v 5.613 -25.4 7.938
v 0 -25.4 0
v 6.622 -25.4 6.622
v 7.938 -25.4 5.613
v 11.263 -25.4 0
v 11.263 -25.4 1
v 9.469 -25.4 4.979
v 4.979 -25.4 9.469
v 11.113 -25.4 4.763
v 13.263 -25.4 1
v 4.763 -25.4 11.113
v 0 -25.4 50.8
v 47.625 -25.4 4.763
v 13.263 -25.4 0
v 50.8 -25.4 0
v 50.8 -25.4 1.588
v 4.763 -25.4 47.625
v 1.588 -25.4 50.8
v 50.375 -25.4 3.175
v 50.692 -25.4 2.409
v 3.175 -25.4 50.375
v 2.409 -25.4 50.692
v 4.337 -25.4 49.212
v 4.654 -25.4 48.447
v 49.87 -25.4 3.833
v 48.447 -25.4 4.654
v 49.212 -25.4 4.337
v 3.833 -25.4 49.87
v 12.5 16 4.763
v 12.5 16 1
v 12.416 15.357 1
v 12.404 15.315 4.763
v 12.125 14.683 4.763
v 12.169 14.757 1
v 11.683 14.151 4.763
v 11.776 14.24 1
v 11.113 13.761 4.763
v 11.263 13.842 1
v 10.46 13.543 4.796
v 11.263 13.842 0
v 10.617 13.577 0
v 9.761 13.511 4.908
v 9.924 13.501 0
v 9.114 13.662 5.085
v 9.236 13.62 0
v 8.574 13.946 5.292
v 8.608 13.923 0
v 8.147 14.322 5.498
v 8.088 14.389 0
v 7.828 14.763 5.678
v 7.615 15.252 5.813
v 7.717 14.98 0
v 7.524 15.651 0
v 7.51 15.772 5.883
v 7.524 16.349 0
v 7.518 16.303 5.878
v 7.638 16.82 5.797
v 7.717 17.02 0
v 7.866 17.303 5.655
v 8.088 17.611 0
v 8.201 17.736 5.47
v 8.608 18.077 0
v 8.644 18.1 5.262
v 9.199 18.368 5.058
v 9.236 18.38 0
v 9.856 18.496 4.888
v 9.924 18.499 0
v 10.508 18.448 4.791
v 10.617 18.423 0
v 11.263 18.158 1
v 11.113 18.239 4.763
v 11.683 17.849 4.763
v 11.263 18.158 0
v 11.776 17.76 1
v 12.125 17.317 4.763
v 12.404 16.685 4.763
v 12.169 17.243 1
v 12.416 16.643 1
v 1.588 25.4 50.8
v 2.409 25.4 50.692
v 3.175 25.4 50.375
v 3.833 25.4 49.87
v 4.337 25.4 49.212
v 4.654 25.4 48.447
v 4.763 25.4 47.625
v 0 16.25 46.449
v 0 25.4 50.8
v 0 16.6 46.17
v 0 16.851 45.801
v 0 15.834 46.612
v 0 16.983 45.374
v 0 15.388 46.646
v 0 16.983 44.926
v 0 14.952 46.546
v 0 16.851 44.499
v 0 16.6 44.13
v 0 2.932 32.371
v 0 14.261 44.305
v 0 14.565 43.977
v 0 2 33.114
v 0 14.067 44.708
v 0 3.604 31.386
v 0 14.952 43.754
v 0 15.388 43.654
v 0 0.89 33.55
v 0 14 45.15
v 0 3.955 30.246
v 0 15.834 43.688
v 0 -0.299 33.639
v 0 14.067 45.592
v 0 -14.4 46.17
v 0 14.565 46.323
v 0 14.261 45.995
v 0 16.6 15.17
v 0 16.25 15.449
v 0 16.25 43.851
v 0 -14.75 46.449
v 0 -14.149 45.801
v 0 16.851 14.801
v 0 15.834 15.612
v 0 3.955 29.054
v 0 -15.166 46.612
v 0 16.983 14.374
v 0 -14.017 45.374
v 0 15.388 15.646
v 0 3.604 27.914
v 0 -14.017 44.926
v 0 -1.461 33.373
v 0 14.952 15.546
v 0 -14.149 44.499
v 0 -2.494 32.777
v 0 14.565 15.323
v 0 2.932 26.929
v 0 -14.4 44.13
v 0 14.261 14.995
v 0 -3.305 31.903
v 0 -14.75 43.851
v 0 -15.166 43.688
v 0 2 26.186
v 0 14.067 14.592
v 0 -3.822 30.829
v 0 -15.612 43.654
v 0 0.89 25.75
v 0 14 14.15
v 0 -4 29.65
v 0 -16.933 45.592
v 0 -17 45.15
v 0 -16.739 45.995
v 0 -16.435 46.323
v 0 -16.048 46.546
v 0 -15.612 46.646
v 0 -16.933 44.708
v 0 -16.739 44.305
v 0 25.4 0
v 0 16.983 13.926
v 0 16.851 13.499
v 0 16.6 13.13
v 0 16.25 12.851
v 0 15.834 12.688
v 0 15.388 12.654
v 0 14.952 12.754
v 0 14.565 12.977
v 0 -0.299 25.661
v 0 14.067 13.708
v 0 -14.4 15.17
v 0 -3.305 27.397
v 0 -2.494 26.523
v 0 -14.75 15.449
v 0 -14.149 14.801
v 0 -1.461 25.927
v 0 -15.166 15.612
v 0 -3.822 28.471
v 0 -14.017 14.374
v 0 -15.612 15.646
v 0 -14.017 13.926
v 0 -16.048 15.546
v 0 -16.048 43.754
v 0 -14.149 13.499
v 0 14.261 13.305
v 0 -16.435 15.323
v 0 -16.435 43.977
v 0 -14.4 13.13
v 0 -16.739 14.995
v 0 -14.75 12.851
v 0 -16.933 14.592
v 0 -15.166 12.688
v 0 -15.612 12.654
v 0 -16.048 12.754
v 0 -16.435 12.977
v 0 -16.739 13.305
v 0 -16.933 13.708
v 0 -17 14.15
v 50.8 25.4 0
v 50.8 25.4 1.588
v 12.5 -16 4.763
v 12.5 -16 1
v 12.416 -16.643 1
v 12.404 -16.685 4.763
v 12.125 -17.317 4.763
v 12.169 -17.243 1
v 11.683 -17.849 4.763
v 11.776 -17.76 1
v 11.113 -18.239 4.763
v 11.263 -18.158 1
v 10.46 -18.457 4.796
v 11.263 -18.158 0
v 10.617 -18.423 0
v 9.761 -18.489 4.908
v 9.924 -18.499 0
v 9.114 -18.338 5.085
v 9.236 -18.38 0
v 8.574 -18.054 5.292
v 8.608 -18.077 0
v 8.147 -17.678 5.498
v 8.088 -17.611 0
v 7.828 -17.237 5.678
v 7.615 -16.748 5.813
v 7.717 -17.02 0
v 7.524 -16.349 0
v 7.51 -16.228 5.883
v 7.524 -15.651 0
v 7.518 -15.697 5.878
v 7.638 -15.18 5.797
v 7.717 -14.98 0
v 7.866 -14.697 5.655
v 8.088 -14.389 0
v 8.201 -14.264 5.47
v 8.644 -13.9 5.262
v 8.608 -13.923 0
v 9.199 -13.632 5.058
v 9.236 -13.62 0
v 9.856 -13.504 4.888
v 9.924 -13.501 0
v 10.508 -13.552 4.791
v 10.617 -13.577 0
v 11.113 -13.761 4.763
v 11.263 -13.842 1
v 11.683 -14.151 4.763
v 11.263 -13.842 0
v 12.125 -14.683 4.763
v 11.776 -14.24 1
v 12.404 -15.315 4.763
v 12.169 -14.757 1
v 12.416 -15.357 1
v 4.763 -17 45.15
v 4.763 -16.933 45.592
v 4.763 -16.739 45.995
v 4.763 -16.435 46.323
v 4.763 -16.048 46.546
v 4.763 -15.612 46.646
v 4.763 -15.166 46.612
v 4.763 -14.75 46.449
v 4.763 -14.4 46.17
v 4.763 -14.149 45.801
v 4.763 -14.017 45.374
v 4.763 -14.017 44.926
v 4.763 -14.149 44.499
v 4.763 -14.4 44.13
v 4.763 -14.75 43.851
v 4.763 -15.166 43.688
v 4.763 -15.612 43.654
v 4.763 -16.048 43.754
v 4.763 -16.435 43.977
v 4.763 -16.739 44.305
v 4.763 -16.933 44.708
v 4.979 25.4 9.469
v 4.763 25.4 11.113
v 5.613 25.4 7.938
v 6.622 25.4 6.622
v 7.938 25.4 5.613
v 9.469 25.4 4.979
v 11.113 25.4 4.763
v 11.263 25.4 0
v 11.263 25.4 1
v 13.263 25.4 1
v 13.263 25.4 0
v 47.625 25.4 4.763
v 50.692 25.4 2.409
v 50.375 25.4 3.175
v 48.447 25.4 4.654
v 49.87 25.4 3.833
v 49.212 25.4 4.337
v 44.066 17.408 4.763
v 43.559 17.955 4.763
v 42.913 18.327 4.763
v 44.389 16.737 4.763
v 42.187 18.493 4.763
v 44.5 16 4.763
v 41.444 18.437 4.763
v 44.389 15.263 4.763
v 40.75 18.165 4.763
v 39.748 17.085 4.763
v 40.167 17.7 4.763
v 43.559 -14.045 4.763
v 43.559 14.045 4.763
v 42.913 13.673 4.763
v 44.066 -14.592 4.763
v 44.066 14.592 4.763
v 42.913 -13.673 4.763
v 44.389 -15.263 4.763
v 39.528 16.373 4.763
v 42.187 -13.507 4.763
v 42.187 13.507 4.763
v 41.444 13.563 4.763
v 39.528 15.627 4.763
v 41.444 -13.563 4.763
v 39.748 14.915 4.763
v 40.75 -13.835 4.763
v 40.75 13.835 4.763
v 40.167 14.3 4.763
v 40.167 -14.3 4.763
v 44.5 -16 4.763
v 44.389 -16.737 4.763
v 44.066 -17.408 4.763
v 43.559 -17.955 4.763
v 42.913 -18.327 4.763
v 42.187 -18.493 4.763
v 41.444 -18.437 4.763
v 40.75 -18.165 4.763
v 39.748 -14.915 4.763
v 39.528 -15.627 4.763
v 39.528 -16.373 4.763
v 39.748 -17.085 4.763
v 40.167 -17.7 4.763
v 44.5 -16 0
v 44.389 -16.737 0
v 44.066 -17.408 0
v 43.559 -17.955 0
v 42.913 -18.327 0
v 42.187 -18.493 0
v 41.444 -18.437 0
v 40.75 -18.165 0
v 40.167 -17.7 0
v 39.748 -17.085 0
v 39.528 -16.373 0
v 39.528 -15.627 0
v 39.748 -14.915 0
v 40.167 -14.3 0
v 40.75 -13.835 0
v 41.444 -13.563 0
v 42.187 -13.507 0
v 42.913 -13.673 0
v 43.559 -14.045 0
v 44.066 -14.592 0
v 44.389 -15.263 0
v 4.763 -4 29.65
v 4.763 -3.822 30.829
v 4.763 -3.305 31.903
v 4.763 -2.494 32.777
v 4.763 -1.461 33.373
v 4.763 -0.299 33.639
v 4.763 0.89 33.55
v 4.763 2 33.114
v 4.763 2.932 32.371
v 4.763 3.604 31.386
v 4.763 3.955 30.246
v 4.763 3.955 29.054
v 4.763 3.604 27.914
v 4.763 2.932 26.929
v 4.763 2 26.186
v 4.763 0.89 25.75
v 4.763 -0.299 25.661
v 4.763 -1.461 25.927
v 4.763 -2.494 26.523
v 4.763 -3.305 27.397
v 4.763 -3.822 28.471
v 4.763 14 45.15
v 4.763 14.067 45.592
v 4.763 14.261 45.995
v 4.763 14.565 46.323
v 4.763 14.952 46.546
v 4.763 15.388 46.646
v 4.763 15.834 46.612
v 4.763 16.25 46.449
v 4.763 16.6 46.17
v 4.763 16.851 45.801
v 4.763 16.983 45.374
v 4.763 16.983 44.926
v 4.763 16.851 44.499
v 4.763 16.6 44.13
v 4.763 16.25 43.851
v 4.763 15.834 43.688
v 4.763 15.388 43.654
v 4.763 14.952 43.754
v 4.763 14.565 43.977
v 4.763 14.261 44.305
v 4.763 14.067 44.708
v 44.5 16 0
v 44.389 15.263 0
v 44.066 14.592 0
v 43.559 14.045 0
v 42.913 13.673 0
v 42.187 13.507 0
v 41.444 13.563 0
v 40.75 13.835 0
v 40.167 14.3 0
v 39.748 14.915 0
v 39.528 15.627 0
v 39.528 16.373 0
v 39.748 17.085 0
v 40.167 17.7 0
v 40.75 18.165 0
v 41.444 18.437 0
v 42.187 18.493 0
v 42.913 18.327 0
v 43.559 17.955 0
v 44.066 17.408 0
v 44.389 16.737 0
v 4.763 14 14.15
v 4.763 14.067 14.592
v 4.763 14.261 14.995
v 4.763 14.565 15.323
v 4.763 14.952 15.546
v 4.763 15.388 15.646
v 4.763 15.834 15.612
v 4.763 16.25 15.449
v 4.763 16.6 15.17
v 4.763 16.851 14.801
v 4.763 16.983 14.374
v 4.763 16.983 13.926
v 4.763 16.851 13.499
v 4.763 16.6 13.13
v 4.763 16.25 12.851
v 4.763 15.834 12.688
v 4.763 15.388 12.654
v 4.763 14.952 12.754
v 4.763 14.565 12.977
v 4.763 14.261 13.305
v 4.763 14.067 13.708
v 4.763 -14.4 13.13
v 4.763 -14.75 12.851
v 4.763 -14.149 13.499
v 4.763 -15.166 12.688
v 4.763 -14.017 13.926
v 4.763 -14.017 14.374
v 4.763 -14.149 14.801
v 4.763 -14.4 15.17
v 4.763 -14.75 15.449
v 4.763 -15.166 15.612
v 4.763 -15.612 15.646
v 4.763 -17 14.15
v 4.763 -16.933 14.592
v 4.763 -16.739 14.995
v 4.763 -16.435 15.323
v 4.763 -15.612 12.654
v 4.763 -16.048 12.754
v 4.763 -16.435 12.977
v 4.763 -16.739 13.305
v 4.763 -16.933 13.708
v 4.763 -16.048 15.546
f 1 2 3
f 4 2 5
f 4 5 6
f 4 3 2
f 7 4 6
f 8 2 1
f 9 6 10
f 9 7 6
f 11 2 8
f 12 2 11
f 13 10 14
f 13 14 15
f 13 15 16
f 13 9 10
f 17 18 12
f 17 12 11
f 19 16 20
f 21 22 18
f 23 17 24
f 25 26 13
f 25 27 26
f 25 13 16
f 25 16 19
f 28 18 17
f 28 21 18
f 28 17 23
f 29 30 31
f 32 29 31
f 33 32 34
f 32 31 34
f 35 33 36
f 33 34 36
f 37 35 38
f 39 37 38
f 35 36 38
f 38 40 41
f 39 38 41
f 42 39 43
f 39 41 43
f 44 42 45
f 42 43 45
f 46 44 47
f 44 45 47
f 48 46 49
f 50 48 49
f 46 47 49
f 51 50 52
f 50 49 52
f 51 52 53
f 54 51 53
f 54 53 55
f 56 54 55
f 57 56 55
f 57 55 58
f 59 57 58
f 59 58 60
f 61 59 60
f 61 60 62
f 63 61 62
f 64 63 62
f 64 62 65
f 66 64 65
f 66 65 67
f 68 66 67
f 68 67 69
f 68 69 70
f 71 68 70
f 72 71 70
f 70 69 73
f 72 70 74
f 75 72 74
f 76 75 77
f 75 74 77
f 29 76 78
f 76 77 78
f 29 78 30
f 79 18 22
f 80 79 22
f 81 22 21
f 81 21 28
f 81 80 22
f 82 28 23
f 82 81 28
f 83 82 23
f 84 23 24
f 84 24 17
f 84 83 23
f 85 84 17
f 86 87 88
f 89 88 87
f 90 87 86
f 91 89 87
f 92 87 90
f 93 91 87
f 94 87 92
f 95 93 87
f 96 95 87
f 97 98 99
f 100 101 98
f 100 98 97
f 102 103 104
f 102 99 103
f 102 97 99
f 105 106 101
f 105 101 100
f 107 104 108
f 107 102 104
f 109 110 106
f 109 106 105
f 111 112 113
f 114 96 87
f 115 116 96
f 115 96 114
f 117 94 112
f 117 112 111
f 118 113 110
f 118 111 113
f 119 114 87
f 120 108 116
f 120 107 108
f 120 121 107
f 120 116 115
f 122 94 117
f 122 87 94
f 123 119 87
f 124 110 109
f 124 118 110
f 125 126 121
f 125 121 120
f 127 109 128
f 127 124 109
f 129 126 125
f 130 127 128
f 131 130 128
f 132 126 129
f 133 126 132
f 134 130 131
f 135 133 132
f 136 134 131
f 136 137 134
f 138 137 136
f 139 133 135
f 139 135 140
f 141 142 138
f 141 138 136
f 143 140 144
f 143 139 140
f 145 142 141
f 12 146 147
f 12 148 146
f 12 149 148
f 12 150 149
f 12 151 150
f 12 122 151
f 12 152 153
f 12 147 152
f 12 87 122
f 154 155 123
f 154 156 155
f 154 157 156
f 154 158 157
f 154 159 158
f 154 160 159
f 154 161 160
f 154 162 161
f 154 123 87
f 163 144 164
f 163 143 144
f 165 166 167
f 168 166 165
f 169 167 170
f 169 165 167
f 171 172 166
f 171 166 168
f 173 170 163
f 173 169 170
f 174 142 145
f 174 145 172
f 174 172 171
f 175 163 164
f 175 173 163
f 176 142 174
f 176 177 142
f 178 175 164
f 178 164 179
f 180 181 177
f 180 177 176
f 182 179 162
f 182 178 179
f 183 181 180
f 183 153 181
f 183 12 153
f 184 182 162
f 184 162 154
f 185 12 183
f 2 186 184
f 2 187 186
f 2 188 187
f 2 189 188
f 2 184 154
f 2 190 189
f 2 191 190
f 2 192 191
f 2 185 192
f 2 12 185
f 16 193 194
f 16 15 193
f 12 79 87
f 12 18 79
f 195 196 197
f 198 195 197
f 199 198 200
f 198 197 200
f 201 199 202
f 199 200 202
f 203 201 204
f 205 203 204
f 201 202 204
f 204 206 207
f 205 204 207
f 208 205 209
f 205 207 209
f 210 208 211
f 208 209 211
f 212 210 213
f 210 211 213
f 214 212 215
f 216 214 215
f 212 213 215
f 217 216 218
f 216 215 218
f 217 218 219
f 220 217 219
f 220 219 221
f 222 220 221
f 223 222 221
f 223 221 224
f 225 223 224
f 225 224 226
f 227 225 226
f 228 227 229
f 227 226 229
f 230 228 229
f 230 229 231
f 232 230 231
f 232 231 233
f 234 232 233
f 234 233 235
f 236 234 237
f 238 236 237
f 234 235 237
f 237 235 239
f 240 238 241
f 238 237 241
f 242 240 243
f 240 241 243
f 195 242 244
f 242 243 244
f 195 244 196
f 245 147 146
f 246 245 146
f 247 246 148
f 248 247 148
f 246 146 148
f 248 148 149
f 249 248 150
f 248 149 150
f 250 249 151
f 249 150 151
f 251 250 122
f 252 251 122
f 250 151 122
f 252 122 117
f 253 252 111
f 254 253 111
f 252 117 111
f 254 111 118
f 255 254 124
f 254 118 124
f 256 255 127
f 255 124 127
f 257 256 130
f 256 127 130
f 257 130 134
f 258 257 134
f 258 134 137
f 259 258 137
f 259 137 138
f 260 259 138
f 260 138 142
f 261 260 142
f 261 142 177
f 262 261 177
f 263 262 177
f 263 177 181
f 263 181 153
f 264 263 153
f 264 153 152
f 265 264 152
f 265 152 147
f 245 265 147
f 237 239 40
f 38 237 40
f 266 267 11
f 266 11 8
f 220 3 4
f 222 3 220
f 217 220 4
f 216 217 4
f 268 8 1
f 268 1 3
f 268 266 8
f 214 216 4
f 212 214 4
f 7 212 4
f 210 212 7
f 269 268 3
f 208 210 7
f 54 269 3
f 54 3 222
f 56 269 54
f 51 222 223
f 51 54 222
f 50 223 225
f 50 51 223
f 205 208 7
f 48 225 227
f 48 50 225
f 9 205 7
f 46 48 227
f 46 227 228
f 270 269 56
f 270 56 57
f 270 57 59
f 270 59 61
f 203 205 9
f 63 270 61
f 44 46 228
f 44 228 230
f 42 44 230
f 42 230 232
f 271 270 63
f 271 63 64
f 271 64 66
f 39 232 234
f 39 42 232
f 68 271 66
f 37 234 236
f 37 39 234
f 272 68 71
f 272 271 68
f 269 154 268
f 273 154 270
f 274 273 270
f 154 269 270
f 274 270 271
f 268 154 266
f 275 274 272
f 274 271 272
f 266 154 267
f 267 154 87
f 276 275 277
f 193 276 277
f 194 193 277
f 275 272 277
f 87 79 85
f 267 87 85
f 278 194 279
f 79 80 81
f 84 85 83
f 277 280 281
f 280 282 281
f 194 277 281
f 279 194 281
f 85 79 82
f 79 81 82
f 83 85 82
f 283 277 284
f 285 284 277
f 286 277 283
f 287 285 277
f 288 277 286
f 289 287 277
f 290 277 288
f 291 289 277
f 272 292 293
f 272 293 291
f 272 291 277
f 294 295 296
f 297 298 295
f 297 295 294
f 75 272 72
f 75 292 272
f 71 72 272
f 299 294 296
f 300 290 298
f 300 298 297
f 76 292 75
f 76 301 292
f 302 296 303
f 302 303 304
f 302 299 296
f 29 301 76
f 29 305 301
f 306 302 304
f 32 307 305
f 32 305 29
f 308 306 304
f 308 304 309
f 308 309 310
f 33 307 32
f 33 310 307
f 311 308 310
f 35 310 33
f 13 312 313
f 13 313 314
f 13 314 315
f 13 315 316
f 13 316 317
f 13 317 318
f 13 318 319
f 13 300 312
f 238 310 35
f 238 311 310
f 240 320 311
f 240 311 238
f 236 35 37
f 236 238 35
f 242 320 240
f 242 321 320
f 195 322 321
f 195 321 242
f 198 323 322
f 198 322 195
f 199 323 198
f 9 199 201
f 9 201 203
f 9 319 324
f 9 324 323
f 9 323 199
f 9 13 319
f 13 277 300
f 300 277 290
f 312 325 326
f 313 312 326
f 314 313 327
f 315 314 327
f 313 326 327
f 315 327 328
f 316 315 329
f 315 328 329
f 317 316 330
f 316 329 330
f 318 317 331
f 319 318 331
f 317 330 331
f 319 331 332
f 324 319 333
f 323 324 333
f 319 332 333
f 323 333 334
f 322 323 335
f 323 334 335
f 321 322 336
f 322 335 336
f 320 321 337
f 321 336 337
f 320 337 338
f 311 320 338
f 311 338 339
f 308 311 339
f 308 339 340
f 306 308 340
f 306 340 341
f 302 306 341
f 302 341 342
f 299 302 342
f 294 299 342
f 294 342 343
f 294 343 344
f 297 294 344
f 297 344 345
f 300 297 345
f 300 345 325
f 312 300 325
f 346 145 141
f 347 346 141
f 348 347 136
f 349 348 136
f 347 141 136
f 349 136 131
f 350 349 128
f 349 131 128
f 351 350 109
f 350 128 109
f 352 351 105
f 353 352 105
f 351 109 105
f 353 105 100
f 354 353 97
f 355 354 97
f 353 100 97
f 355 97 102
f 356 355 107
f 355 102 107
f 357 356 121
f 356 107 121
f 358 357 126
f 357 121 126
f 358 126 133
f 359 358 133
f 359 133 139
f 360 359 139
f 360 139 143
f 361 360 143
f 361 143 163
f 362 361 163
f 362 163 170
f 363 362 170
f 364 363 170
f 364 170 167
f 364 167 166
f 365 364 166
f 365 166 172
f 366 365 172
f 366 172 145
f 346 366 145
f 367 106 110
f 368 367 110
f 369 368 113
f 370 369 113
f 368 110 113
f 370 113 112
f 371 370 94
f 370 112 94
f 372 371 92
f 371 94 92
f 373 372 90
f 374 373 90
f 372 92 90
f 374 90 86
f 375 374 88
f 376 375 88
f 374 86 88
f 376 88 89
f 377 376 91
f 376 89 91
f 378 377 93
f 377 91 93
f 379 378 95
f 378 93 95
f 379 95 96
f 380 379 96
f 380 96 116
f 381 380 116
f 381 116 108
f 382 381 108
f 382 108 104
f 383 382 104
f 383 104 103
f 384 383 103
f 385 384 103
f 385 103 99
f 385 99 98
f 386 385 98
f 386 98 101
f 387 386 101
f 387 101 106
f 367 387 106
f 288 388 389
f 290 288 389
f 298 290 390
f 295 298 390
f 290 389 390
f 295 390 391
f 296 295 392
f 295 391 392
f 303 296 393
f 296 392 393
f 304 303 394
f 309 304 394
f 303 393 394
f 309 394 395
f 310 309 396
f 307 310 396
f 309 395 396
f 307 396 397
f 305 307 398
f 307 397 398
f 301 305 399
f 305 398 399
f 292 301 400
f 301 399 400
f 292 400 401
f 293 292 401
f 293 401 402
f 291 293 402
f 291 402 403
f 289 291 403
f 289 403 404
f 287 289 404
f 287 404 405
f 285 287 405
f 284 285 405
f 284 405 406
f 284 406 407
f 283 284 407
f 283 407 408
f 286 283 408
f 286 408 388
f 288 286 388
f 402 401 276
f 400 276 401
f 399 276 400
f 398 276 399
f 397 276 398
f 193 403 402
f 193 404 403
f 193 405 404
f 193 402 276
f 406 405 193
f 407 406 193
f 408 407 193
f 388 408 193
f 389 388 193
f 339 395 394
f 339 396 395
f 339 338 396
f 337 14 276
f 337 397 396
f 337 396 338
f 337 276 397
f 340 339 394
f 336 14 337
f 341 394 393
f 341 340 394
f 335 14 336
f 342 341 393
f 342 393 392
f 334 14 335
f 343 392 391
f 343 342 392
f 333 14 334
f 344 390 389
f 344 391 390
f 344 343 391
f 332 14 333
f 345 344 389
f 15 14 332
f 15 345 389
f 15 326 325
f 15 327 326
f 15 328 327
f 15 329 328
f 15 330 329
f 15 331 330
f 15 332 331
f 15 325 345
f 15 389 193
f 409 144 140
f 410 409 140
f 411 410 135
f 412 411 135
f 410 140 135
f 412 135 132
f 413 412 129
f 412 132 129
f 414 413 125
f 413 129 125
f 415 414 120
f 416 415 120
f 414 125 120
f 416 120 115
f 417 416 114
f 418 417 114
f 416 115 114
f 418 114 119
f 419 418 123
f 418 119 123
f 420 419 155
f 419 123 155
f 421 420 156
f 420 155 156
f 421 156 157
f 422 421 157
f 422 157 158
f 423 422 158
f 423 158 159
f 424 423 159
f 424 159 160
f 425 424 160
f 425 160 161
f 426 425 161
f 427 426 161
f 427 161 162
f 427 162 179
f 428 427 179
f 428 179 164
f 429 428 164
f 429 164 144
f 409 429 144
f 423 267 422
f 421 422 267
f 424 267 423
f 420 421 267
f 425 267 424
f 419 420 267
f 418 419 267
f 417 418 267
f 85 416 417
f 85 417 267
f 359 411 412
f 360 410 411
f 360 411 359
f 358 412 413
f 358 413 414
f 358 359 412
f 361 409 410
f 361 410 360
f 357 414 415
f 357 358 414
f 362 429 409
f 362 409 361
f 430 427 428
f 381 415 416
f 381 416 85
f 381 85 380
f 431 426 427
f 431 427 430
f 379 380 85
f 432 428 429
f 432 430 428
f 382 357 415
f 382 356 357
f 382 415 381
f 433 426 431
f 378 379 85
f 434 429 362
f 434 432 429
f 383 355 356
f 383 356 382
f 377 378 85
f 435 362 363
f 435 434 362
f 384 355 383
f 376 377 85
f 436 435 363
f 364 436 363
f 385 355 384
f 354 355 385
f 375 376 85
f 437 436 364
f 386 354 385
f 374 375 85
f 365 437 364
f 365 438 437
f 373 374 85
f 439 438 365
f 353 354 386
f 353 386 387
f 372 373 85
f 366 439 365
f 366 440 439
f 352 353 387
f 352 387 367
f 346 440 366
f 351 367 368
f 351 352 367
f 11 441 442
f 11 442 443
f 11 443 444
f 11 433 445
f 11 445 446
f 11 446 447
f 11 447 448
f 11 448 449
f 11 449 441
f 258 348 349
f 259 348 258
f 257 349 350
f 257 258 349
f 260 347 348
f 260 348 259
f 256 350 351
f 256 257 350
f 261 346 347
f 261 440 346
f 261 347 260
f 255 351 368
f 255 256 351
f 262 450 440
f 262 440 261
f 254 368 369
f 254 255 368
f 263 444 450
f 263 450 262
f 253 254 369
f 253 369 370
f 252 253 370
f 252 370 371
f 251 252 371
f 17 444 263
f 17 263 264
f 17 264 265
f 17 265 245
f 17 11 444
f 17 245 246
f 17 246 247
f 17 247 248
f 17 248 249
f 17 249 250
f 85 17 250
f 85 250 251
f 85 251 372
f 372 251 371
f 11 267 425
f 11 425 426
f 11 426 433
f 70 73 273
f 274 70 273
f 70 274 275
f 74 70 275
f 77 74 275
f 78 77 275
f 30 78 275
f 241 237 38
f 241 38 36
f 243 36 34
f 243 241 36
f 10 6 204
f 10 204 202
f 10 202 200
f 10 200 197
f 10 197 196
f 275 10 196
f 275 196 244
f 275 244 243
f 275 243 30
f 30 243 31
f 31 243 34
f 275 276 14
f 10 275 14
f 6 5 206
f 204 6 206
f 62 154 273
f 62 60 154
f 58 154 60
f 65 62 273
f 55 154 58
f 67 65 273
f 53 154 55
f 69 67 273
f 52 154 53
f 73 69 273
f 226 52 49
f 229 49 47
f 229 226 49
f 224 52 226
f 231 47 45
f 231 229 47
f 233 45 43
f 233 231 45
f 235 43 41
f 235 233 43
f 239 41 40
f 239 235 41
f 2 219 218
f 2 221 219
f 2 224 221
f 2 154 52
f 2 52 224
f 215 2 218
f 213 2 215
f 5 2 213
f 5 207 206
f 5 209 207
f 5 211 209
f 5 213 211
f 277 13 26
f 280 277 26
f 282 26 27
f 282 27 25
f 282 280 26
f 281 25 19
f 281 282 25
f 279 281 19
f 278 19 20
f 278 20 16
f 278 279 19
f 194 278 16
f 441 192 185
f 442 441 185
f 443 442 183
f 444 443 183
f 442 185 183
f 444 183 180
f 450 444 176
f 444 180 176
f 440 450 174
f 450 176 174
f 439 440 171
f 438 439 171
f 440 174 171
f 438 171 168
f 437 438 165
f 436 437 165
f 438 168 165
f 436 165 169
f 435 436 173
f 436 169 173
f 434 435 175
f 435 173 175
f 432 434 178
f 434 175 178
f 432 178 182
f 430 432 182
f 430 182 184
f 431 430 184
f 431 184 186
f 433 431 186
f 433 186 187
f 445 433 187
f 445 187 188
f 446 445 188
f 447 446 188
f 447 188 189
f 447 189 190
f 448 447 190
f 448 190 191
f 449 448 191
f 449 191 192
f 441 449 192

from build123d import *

# Parameters (mm, degrees)
F1_DEPTH = 25.4
F2_R     = 3.175
F3_R     = 6.35
F4_R     = 2.5
F5_DEPTH = 50.801
F6_R     = 1.5
F6_R_2   = 4
F7_DEPTH = 50.801
F9_DEPTH = 1


with BuildPart() as f1:
    # F0 (on Front) → F1 (new body, symmetric)
    with BuildSketch(Plane.XZ):
        Polygon((4.76258, 50.8), (0, 50.8), (0, 0), (50.8, 0), (50.8, 4.76258), (4.76258, 4.76258), align=None)
    extrude(amount=F1_DEPTH, both=True)

    # F2
    f2_edges = [f1.edges().sort_by_distance(p)[0] for p in [
        (4.76258, 0, 50.8),
        (50.8, 0, 4.76258),
    ]]
    fillet(f2_edges, radius=F2_R)

    # F3
    f3_edges = [f1.edges().sort_by_distance(p)[0] for p in [
        (4.76258, 0, 4.76258),
    ]]
    fillet(f3_edges, radius=F3_R)

    # F4 (on face) → F5 (cut, through all)
    with BuildSketch(Plane(origin=(0, 0, 0), x_dir=(1, 0, 0), z_dir=(0, 0, -1))):
        with Locations((10, 16)):
            Circle(F4_R)
        with Locations((42, 16)):
            Circle(F4_R)
        with Locations((42, -16)):
            Circle(F4_R)
        with Locations((10, -16)):
            Circle(F4_R)
    extrude(amount=-F5_DEPTH, mode=Mode.SUBTRACT)

    # F6 (on face) → F7 (cut, through all)
    with BuildSketch(Plane(origin=(0, 0, 0), x_dir=(0, -1, 0), z_dir=(-1, 0, 0))):
        with Locations((15.5, 45.15)):
            Circle(F6_R)
        with Locations((15.5, 14.15)):
            Circle(F6_R)
        with Locations((-15.5, 14.15)):
            Circle(F6_R)
        with Locations((-15.5, 45.15)):
            Circle(F6_R)
        with Locations((0, 29.65)):
            Circle(F6_R_2)
    extrude(amount=-F7_DEPTH, mode=Mode.SUBTRACT)

    # F8 (on face) → F9 (cut)
    with BuildSketch(Plane(origin=(0, 0, 0), x_dir=(1, 0, 0), z_dir=(0, 0, -1))):
        with BuildLine():
            Line((13.263, -25.4), (13.263, 25.4))
            Line((13.263, 25.4), (11.263, 25.4))
            Line((11.263, 25.4), (11.263, 18.157506))
            ThreePointArc((11.263, 18.157506), (12.168813, 17.243483), (12.5, 16))
            ThreePointArc((12.5, 16), (12.168813, 14.756517), (11.263, 13.842494))
            Line((11.263, 13.842494), (11.263, -13.842494))
            ThreePointArc((11.263, -13.842494), (12.168813, -14.756517), (12.5, -16))
            ThreePointArc((12.5, -16), (12.168813, -17.243483), (11.263, -18.157506))
            Line((11.263, -18.157506), (11.263, -25.4))
            Line((11.263, -25.4), (13.263, -25.4))
        make_face()
    extrude(amount=-F9_DEPTH, mode=Mode.SUBTRACT)


solid = f1.part
